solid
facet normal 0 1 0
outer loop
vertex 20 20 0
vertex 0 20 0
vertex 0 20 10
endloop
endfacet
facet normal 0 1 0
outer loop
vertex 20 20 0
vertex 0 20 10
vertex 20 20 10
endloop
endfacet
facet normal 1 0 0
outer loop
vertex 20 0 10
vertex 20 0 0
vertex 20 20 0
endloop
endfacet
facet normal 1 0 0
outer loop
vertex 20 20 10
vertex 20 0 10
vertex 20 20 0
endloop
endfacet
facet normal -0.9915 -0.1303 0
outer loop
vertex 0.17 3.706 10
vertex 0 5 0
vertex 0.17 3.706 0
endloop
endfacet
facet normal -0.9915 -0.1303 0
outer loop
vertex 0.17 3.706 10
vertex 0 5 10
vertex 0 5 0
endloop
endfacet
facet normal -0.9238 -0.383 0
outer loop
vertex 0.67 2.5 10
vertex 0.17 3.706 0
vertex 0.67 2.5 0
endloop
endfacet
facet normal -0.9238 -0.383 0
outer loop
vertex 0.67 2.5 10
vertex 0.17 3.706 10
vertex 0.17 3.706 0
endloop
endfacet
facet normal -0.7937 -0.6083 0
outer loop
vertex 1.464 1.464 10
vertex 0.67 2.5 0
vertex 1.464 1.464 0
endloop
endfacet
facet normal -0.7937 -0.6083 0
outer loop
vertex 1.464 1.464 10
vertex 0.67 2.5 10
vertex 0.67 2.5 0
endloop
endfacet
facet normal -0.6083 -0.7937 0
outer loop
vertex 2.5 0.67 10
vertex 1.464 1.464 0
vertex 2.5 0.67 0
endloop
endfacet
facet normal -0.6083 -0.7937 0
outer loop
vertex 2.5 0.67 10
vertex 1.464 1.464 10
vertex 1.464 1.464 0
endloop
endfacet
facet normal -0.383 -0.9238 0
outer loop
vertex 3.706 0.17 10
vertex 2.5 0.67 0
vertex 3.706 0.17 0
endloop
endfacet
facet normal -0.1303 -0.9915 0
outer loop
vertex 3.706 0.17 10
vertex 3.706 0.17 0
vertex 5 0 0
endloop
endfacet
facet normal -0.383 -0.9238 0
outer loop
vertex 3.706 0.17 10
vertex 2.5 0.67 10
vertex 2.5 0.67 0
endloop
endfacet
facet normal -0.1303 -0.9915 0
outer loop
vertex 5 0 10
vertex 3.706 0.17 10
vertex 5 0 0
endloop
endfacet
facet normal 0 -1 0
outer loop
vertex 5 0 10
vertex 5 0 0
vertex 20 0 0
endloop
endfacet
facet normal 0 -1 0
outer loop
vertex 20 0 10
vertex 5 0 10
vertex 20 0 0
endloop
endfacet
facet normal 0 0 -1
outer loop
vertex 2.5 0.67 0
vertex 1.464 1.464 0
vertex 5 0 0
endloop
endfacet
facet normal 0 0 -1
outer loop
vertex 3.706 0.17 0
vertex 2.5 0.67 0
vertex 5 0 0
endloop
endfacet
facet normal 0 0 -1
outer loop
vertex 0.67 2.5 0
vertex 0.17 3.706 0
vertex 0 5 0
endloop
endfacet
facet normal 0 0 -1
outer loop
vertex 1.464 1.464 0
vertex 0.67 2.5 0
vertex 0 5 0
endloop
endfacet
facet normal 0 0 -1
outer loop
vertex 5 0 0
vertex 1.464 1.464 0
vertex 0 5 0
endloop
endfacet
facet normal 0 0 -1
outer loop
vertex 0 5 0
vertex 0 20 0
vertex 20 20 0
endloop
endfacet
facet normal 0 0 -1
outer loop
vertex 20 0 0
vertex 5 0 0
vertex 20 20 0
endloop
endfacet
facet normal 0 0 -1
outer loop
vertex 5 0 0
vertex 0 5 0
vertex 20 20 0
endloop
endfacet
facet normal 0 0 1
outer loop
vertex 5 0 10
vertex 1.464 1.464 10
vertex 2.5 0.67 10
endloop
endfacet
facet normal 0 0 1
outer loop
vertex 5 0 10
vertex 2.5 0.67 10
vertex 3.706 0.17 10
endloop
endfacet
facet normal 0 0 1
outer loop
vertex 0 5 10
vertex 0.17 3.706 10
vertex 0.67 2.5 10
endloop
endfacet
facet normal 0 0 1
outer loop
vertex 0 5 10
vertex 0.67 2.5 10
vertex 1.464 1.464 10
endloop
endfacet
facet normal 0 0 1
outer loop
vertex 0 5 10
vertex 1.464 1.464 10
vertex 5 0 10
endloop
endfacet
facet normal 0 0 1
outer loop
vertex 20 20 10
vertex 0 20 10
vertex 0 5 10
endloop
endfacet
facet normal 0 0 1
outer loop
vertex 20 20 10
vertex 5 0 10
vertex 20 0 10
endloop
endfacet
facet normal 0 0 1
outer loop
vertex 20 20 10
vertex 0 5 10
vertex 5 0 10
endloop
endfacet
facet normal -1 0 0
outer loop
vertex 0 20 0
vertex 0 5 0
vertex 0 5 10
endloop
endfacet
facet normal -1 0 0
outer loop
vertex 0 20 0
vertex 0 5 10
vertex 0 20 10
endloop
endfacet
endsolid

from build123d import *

# Parameters (mm, degrees)
SKETCH_1_W    = 20
SKETCH_1_H    = 20
BASEBOX_DEPTH = 10
FILLET_2_R    = 5


with BuildPart() as part:
    # 草图1 → BaseBox (new body)
    with BuildSketch(Plane.XY):
        with Locations((10, 10)):
            Rectangle(SKETCH_1_W, SKETCH_1_H)
    extrude(amount=BASEBOX_DEPTH)

    # Fillet 2
    fillet_2_edges = [part.edges().sort_by_distance(p)[0] for p in [
        (0, 0, 5),
    ]]
    fillet(fillet_2_edges, radius=FILLET_2_R)


solid = part.part
